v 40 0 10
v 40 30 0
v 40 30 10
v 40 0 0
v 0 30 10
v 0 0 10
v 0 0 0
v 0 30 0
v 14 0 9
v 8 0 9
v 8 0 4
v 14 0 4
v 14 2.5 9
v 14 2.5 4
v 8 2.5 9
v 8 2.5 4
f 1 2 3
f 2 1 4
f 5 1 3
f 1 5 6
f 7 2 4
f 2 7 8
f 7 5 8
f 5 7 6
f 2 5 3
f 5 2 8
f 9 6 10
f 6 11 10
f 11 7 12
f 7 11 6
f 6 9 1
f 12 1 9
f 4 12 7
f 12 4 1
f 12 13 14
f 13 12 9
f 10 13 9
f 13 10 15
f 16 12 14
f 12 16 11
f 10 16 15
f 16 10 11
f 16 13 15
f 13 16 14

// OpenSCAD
// units=mm — generated by scad_emitter.py
// part=unnamed
$fn = 48;

difference() { cube([40, 30, 10]); translate([8, -0.5, 4]) cube([6, 3, 5]); }
